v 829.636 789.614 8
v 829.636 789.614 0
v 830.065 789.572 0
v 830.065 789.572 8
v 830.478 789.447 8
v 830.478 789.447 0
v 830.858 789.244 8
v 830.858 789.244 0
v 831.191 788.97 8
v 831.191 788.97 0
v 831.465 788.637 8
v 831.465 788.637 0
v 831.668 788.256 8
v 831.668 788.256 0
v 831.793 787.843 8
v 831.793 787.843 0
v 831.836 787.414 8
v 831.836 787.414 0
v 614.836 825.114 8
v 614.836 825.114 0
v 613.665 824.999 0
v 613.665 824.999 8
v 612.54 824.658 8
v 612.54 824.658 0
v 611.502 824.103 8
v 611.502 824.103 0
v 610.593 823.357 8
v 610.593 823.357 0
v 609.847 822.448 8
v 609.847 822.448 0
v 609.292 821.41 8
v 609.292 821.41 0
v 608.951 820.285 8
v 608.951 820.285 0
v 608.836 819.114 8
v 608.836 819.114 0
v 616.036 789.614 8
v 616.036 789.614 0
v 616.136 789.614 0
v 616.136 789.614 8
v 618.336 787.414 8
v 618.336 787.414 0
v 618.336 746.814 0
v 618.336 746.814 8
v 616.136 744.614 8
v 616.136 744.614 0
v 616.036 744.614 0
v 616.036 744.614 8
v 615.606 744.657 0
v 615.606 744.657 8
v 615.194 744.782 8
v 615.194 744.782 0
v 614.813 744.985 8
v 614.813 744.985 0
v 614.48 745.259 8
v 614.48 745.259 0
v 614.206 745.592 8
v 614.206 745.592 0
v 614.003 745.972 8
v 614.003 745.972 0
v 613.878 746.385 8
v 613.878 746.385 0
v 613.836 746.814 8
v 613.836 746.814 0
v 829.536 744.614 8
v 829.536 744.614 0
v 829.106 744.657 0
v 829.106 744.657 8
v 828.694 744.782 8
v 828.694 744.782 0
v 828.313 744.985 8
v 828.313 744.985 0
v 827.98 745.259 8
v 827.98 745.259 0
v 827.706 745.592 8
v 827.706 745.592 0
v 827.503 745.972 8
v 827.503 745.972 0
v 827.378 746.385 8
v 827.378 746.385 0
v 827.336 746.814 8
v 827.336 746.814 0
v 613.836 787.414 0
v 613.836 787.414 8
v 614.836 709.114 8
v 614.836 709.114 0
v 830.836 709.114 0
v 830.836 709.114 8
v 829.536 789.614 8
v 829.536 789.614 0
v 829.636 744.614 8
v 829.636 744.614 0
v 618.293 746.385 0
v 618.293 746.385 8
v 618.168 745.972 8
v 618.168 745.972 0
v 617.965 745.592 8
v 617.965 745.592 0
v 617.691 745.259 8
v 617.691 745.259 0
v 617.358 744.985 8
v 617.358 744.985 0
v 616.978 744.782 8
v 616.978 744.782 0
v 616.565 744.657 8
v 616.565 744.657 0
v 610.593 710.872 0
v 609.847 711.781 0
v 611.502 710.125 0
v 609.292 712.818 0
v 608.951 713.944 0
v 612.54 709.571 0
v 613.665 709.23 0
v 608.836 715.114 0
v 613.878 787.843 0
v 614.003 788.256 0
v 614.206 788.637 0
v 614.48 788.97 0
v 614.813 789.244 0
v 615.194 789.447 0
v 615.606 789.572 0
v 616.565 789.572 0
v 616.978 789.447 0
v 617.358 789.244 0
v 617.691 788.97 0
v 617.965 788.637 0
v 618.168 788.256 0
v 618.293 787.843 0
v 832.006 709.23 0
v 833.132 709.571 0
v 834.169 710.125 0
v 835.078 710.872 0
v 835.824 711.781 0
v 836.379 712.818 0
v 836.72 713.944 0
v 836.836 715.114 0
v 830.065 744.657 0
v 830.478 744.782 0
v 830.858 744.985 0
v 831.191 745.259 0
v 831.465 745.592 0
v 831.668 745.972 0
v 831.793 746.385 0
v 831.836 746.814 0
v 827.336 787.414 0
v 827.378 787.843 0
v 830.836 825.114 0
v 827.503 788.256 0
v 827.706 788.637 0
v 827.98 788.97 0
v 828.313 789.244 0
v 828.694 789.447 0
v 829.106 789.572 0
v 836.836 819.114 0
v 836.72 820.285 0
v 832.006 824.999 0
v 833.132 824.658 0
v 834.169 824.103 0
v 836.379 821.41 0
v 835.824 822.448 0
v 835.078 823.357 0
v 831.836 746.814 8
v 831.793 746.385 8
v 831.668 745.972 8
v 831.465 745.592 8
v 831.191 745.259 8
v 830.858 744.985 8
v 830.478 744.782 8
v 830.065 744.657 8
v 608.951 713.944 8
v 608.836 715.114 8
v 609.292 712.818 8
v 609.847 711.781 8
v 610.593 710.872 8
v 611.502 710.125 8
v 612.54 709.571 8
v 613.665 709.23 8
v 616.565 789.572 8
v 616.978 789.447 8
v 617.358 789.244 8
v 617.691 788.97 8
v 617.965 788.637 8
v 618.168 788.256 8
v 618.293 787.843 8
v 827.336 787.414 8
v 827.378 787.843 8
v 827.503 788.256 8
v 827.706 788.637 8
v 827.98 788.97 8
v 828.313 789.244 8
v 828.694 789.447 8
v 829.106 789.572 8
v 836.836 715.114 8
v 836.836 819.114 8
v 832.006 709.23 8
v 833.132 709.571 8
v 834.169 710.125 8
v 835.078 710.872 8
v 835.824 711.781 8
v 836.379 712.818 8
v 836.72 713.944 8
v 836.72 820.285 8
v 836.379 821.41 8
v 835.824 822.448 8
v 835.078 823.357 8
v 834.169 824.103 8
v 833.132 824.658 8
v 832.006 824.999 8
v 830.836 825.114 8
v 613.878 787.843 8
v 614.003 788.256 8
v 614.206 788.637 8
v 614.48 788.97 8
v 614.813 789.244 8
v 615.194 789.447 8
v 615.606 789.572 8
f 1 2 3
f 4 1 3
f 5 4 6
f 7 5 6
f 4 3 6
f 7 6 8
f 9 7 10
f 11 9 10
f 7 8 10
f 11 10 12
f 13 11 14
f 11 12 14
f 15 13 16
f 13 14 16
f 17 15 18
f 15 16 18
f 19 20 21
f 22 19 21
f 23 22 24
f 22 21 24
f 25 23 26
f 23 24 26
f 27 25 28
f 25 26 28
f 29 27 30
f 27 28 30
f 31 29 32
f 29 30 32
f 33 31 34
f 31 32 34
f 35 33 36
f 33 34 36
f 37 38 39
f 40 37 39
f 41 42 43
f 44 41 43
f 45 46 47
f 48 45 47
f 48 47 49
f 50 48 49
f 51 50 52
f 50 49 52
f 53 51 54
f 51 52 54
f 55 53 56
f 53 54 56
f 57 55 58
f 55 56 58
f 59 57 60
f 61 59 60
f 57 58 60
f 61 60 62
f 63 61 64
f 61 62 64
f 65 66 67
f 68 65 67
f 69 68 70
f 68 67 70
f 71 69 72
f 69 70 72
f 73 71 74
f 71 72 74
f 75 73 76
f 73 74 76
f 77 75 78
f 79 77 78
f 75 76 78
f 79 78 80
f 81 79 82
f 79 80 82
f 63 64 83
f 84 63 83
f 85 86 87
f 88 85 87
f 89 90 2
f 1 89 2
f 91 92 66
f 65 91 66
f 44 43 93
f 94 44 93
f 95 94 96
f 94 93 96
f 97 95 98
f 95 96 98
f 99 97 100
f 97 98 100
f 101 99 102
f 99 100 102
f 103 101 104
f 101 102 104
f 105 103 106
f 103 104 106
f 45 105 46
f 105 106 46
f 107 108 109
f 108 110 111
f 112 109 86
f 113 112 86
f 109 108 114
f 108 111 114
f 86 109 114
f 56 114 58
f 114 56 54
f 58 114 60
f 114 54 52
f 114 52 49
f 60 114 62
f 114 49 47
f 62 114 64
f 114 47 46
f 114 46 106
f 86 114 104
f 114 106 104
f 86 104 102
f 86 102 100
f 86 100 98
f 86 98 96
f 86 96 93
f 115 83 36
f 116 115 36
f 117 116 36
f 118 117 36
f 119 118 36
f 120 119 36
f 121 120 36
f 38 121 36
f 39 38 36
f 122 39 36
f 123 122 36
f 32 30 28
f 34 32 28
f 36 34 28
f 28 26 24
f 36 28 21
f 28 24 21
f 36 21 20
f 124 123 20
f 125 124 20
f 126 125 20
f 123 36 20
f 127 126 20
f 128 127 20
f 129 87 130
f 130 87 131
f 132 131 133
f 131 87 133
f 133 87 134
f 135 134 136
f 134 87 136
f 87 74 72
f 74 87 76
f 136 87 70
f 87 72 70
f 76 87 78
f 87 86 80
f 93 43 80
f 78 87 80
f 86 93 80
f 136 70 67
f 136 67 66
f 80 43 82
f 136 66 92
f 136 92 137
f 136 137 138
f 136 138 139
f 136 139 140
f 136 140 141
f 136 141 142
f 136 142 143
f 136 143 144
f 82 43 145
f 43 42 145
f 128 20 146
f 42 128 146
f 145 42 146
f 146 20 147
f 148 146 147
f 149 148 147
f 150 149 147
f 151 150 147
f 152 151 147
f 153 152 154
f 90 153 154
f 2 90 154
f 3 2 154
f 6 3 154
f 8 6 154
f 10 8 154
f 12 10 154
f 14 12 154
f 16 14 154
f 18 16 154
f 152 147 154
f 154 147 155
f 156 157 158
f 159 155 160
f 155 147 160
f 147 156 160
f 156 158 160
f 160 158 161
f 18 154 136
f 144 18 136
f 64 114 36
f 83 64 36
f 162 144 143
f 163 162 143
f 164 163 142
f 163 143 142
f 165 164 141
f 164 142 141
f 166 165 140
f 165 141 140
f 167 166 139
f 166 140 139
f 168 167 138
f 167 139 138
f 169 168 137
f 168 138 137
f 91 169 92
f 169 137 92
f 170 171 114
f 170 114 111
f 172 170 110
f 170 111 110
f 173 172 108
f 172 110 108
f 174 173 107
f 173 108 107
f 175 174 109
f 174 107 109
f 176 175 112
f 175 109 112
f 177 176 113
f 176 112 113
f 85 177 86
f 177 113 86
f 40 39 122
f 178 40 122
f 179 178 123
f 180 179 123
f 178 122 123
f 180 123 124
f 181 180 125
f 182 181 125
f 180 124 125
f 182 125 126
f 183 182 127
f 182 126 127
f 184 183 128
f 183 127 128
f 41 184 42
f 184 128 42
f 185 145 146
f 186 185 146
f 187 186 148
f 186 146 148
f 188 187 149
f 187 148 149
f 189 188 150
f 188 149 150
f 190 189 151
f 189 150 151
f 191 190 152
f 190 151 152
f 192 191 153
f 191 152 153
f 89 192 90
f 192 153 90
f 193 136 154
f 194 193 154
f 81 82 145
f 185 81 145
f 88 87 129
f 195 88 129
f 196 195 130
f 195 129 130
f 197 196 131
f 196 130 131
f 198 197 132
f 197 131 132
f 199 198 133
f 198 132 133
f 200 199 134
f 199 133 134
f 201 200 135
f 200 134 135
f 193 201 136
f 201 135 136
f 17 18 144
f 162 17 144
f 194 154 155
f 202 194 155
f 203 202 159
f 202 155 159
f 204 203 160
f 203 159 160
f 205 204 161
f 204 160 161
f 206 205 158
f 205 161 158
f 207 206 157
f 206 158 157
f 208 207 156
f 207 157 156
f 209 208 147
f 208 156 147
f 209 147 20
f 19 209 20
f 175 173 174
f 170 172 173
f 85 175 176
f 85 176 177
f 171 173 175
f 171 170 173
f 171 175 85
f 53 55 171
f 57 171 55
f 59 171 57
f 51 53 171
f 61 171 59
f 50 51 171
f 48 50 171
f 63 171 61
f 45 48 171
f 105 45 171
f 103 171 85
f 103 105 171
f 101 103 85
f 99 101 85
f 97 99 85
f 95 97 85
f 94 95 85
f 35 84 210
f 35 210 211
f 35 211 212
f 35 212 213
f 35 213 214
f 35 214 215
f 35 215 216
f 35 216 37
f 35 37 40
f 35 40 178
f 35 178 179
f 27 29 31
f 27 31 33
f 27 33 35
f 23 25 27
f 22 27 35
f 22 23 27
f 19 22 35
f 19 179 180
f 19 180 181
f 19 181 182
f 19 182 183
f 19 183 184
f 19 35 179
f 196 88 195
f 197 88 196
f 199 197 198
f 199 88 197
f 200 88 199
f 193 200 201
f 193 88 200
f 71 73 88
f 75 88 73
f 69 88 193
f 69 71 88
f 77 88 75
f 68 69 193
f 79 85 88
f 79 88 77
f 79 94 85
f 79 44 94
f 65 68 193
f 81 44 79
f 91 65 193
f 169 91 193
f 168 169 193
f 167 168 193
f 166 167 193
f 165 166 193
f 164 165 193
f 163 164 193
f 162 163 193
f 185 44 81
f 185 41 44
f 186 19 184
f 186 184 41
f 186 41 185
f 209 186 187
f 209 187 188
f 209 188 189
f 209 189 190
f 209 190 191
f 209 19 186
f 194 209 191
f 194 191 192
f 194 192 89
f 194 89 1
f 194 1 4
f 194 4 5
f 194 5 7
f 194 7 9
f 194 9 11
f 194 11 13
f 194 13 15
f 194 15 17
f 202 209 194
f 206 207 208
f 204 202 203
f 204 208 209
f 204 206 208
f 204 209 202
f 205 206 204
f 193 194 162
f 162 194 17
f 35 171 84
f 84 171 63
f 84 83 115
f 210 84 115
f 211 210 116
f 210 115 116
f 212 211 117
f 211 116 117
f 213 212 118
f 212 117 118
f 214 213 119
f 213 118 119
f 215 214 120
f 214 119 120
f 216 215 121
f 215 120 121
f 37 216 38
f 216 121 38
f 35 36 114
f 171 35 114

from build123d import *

# Parameters (mm, degrees)
SALIENTE_EXTRUIR1_DEPTH = 8
CORTAR_EXTRUIR1_DEPTH   = 10


with BuildPart() as part:
    # Croquis2 → Saliente-Extruir1 (new body)
    with BuildSketch(Plane.XY):
        with BuildLine():
            Line((614.835603051, 709.114300051), (830.835603051, 709.114300051))
            ThreePointArc((830.835603051, 709.114300051), (835.078243738, 710.871659363), (836.835603051, 715.114300051))
            Line((836.835603051, 715.114300051), (836.835603051, 819.114300051))
            ThreePointArc((836.835603051, 819.114300051), (835.078243738, 823.356940738), (830.835603051, 825.114300051))
            Line((830.835603051, 825.114300051), (614.835603051, 825.114300051))
            ThreePointArc((614.835603051, 825.114300051), (610.592962364, 823.356940738), (608.835603051, 819.114300051))
            Line((608.835603051, 819.114300051), (608.835603051, 715.114300051))
            ThreePointArc((608.835603051, 715.114300051), (610.592962364, 710.871659363), (614.835603051, 709.114300051))
        make_face()
    extrude(amount=SALIENTE_EXTRUIR1_DEPTH)

    # Croquis3 → Cortar-Extruir1 (cut)
    with BuildSketch(Plane(origin=(0, 0, 0), x_dir=(-1, 0, 0), z_dir=(0, 0, -1))):
        with BuildLine():
            Line((-616.135603051, 744.614300051), (-616.035603051, 744.614300051))
            ThreePointArc((-616.035603051, 744.614300051), (-614.479968132, 745.258665132), (-613.835603051, 746.814300051))
            Line((-613.835603051, 746.814300051), (-613.835603051, 787.414300051))
            ThreePointArc((-613.835603051, 787.414300051), (-614.479968132, 788.969934969), (-616.035603051, 789.614300051))
            Line((-616.035603051, 789.614300051), (-616.135603051, 789.614300051))
            ThreePointArc((-616.135603051, 789.614300051), (-617.691237969, 788.969934969), (-618.335603051, 787.414300051))
            Line((-618.335603051, 787.414300051), (-618.335603051, 746.814300051))
            ThreePointArc((-618.335603051, 746.814300051), (-617.691237969, 745.258665132), (-616.135603051, 744.614300051))
        make_face()
        with BuildLine():
            Line((-829.535603051, 789.614300051), (-829.635603051, 789.614300051))
            ThreePointArc((-829.635603051, 789.614300051), (-831.191237969, 788.969934969), (-831.835603051, 787.414300051))
            Line((-831.835603051, 787.414300051), (-831.835603051, 746.814300051))
            ThreePointArc((-831.835603051, 746.814300051), (-831.191237969, 745.258665132), (-829.635603051, 744.614300051))
            Line((-829.635603051, 744.614300051), (-829.535603051, 744.614300051))
            ThreePointArc((-829.535603051, 744.614300051), (-827.979968132, 745.258665132), (-827.335603051, 746.814300051))
            Line((-827.335603051, 746.814300051), (-827.335603051, 787.414300051))
            ThreePointArc((-827.335603051, 787.414300051), (-827.979968132, 788.969934969), (-829.535603051, 789.614300051))
        make_face()
    extrude(amount=-CORTAR_EXTRUIR1_DEPTH, mode=Mode.SUBTRACT)


solid = part.part
